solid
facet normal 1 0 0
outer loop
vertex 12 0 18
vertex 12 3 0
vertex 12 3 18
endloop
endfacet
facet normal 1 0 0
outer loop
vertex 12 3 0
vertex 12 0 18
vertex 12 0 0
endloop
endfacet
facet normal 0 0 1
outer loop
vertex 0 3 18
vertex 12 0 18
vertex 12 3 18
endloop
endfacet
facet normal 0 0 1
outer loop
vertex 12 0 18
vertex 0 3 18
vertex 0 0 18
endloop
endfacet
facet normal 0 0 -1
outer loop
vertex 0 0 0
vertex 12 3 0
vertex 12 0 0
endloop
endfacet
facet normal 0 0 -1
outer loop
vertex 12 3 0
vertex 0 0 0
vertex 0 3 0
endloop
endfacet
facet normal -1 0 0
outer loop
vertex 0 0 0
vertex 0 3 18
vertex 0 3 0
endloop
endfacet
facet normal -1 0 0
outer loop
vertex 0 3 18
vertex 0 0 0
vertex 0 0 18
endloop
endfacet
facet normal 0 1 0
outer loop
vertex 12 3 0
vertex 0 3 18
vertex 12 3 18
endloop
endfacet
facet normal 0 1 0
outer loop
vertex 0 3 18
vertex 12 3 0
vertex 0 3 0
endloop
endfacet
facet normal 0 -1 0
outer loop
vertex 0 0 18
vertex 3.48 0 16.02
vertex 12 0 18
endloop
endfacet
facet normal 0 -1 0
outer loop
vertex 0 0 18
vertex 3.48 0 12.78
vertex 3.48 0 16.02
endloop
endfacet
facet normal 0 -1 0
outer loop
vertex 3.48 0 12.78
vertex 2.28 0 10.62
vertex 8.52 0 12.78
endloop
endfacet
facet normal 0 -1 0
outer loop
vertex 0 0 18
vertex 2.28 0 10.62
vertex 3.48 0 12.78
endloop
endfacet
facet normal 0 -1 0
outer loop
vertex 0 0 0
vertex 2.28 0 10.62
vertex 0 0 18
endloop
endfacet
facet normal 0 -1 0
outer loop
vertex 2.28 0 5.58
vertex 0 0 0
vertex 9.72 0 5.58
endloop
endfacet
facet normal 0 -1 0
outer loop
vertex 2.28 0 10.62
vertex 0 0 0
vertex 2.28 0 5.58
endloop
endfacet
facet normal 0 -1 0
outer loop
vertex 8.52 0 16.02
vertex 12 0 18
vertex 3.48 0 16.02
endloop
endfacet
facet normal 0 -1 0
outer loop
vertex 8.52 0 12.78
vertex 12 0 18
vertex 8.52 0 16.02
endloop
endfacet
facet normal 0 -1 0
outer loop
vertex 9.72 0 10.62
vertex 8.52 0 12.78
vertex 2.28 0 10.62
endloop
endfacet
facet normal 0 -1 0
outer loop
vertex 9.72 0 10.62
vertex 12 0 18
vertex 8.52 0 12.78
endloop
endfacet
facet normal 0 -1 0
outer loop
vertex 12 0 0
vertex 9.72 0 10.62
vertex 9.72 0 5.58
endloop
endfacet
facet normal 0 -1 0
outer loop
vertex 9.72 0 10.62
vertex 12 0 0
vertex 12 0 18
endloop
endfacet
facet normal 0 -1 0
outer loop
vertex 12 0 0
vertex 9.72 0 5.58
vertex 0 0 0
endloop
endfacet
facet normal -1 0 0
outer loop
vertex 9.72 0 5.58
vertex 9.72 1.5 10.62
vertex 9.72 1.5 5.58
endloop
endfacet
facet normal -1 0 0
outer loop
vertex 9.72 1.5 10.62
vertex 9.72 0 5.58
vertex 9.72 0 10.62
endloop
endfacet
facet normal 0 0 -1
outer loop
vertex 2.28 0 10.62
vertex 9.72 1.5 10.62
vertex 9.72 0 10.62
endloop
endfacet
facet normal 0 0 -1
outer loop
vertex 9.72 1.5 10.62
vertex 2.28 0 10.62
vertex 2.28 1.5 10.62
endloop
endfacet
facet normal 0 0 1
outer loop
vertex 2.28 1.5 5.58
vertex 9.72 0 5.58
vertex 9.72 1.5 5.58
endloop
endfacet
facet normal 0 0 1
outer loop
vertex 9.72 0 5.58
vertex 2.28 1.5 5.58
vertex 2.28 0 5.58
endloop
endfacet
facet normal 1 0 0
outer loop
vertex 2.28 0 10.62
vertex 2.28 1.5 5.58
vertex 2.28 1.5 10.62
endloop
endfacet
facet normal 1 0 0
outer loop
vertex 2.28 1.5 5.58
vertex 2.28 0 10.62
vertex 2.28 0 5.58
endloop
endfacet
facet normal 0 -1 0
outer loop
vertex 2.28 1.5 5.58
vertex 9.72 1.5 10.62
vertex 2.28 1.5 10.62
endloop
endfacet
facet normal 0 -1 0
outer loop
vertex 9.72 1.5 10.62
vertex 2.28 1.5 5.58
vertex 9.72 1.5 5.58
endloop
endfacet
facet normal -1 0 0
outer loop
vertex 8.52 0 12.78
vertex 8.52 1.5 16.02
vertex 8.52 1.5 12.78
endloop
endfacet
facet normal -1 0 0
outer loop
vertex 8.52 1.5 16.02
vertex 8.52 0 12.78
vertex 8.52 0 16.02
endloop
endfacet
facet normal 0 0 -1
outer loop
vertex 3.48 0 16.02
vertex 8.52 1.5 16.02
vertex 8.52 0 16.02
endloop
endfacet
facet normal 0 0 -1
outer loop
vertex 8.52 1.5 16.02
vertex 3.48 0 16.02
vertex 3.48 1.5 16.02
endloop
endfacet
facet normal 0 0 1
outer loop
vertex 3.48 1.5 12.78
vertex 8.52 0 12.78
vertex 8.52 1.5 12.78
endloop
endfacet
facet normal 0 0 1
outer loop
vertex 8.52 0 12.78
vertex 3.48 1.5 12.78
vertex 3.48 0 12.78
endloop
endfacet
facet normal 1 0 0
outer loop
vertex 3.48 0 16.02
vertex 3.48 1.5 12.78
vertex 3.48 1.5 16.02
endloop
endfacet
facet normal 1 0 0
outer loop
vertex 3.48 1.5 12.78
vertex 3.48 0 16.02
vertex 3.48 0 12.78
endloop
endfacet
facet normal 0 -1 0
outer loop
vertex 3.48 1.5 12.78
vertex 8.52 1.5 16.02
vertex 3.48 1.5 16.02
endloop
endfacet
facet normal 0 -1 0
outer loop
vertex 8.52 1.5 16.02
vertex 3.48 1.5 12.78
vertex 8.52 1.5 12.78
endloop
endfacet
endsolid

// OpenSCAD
// DIN-rail retaining clip.
$fn = 60;
eps = 0.02;
clip_w = 12;
clip_h = 18;
clip_t = 3;
difference() { cube([clip_w,clip_t,clip_h]); translate([clip_w/2, -eps, clip_h*0.45]) cube([clip_w*0.62,clip_t+2*eps,clip_h*0.28],center=true); translate([clip_w/2, -eps, clip_h*0.8]) cube([clip_w*0.42,clip_t+2*eps,clip_h*0.18],center=true); }
